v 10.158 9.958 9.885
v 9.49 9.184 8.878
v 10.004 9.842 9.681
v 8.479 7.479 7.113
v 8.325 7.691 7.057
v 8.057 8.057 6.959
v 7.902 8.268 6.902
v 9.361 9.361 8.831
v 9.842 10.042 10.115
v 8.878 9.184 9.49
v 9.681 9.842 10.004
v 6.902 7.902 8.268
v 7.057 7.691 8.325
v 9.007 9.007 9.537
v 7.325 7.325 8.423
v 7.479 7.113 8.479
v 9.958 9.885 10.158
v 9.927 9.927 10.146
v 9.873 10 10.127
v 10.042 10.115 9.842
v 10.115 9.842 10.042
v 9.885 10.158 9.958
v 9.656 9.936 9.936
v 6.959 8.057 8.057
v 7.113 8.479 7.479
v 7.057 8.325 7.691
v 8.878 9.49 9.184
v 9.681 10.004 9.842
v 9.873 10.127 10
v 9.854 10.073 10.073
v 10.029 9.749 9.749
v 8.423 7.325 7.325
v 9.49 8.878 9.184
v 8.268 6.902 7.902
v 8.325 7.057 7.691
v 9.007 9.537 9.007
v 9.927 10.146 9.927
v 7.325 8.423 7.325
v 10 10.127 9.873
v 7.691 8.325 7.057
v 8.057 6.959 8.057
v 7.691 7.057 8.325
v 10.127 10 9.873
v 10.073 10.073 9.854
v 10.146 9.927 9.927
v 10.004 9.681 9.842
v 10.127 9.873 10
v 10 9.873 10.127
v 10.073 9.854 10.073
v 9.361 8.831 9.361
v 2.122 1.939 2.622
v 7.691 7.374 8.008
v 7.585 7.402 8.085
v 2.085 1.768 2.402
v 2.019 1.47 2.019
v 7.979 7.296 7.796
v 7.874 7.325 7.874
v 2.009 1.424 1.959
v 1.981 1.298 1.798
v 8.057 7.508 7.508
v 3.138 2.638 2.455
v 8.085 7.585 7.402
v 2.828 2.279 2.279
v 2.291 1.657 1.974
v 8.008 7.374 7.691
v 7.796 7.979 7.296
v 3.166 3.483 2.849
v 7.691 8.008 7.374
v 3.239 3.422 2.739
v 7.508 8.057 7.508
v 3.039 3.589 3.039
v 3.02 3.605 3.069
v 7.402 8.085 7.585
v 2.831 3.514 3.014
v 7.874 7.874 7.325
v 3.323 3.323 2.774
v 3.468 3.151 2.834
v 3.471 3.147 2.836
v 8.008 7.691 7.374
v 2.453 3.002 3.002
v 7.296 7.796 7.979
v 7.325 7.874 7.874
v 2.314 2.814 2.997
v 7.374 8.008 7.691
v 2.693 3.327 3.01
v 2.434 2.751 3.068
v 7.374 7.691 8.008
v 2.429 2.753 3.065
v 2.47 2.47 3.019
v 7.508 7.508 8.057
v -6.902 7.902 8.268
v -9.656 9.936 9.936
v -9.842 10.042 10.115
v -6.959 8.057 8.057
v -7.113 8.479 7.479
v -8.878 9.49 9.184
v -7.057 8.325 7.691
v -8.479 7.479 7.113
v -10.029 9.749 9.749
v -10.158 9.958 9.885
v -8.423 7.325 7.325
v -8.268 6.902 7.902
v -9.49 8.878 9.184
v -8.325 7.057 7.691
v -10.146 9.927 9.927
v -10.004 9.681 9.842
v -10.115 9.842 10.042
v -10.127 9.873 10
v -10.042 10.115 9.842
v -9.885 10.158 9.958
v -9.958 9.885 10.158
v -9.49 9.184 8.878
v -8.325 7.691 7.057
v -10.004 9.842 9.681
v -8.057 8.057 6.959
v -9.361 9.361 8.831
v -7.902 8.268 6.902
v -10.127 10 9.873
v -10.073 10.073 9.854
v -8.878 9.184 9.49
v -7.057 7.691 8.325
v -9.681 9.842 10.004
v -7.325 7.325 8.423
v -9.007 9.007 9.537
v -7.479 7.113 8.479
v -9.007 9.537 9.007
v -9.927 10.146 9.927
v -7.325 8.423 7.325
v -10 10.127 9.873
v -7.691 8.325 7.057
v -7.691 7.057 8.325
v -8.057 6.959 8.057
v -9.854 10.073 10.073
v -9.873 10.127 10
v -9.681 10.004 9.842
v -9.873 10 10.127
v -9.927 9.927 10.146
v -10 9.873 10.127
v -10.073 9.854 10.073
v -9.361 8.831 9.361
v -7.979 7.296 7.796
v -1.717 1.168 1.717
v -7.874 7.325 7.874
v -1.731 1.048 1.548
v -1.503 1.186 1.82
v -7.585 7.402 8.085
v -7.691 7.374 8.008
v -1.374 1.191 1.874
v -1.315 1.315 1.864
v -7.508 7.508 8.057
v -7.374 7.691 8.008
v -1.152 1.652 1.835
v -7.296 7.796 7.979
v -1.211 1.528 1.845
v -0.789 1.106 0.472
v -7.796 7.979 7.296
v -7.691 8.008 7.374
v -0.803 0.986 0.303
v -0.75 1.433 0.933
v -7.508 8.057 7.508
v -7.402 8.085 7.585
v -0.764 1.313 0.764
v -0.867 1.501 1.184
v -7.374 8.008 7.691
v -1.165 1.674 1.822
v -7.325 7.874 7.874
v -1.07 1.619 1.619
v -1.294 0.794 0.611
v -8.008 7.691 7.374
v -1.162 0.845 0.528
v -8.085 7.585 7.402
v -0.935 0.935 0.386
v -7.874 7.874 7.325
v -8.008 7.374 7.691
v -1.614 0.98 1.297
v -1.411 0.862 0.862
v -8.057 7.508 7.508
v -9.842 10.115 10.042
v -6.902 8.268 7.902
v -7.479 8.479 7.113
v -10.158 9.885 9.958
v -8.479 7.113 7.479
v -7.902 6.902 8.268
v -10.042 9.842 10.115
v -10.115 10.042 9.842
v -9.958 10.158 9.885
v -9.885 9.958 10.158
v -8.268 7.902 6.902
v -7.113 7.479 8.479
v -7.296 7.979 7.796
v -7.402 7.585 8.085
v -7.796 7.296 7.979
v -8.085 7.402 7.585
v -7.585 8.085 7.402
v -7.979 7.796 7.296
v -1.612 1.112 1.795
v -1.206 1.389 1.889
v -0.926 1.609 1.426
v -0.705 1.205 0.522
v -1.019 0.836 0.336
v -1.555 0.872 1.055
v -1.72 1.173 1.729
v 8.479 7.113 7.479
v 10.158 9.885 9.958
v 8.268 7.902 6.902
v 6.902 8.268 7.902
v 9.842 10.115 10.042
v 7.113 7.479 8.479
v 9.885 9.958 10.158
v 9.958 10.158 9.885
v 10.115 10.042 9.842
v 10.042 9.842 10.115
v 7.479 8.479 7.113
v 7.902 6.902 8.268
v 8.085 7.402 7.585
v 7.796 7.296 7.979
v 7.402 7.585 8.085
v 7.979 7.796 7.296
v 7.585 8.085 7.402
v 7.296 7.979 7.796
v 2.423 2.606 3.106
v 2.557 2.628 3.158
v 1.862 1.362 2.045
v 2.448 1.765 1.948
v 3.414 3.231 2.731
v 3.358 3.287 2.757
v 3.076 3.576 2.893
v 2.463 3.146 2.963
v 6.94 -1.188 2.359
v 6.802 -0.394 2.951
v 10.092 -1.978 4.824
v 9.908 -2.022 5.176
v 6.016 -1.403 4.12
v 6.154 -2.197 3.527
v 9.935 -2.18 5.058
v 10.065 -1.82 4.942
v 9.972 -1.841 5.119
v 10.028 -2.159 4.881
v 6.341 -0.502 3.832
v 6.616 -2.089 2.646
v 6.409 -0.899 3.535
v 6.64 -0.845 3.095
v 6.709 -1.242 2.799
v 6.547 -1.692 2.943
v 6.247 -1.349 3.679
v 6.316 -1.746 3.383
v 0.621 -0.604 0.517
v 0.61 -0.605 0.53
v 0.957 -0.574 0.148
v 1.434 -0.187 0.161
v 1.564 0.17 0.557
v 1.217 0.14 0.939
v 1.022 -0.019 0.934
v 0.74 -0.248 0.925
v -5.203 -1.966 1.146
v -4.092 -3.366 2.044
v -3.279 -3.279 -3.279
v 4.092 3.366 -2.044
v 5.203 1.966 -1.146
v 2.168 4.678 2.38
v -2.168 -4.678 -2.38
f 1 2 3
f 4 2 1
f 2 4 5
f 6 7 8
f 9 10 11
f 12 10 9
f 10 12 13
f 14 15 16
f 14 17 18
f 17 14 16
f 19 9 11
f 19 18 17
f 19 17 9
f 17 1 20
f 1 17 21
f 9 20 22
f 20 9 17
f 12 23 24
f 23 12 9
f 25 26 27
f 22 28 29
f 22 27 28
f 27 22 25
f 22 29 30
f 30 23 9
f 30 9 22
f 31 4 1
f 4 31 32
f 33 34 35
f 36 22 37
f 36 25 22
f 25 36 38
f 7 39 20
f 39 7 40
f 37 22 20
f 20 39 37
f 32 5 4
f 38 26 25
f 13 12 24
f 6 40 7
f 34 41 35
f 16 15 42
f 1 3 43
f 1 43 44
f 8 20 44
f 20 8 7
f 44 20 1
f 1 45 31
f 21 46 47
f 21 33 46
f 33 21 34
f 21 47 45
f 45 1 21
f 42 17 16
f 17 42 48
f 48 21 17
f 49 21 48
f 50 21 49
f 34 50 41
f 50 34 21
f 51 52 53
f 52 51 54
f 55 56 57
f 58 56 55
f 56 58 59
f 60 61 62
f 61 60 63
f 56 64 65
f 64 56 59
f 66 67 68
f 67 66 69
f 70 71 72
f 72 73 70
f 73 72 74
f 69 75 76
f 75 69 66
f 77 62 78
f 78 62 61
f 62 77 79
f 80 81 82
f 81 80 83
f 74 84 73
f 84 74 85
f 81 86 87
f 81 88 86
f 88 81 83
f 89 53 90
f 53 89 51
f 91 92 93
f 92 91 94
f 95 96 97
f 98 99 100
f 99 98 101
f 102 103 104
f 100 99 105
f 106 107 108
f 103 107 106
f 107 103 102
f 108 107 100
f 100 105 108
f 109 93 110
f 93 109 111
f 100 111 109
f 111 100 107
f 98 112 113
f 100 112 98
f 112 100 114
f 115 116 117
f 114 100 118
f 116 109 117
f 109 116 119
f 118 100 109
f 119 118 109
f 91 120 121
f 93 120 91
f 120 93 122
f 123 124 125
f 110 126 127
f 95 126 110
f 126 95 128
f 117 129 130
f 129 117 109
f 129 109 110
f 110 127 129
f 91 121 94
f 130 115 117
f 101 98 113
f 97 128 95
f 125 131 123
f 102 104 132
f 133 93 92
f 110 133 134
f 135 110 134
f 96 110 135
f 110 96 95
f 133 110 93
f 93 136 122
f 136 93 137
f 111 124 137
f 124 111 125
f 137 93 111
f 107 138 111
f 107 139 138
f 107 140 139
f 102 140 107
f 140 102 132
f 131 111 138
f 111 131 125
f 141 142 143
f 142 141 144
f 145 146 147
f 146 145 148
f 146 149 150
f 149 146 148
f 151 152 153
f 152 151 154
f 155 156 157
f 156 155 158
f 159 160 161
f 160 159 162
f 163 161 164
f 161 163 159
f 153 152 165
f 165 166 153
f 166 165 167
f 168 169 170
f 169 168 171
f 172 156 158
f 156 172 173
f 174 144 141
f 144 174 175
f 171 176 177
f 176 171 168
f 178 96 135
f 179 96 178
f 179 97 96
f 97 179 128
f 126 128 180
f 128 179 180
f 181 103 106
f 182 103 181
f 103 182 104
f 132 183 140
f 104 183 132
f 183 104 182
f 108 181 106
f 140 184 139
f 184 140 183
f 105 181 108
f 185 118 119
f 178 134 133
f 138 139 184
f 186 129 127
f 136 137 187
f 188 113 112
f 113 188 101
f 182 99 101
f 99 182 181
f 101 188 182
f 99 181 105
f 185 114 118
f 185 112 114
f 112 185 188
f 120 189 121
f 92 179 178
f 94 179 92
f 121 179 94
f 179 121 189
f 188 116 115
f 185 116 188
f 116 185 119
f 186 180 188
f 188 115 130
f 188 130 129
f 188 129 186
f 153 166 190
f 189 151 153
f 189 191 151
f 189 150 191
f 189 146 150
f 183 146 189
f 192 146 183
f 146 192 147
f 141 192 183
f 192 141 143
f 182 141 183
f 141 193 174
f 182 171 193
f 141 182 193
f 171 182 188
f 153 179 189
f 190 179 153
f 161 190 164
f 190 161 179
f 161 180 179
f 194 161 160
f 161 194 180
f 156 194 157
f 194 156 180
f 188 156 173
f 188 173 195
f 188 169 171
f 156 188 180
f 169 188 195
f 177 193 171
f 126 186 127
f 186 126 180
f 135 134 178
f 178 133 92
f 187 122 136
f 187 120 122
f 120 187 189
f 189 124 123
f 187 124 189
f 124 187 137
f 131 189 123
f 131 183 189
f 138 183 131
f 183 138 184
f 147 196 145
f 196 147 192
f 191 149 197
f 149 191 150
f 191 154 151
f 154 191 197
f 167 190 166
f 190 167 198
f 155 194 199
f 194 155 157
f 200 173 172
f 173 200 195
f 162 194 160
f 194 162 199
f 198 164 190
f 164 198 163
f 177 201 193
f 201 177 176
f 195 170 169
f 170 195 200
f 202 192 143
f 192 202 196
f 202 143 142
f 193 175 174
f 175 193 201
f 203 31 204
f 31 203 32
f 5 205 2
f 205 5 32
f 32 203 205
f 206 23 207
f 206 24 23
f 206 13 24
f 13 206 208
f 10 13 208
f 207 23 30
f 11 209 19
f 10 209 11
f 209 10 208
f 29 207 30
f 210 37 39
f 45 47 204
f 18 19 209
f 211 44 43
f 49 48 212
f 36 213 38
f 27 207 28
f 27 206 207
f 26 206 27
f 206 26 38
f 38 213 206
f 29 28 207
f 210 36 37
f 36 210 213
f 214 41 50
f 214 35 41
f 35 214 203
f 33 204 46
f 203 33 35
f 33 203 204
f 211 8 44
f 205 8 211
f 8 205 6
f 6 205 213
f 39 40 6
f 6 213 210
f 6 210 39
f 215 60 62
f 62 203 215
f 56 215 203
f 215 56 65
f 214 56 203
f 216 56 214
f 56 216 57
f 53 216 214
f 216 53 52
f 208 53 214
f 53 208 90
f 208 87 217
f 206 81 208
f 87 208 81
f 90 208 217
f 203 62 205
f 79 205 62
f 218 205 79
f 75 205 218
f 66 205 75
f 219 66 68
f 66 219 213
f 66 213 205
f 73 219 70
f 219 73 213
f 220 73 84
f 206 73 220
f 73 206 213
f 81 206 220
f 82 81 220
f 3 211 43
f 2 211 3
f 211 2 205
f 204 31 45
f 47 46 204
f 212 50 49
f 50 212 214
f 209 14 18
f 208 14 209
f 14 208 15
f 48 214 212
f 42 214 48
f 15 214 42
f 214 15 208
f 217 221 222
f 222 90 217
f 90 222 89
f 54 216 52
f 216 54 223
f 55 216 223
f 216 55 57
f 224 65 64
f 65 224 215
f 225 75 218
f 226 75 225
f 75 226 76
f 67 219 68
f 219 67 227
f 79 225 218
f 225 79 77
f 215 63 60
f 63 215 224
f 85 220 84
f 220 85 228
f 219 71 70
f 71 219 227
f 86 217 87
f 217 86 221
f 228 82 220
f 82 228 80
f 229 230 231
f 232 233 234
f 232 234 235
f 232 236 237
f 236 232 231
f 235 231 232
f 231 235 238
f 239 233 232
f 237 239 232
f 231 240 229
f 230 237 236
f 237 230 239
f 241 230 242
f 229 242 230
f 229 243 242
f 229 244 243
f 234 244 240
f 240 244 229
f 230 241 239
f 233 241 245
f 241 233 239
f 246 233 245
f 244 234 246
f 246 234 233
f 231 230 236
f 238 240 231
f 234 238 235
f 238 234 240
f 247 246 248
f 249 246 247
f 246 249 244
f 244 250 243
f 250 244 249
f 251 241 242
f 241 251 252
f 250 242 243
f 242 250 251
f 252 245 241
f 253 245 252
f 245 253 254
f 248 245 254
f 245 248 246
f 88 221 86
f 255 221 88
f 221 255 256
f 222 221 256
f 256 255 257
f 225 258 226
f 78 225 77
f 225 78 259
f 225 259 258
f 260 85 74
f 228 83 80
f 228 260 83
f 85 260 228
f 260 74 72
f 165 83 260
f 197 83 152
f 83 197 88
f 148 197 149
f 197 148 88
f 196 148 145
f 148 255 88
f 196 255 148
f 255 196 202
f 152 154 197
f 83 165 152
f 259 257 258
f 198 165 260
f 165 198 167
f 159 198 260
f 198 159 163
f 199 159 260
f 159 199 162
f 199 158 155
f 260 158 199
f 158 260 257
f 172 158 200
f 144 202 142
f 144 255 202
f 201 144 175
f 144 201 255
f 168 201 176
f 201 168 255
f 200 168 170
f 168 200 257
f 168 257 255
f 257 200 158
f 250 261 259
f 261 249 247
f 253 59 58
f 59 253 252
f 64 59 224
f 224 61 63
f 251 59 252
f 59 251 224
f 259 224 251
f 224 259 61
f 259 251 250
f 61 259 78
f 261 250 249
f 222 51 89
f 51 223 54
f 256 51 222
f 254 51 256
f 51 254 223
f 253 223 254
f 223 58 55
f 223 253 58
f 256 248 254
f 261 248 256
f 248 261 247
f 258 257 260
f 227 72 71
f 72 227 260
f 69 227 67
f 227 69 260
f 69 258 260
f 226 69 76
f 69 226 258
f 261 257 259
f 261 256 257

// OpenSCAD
//---------------------------------------------------------------
//-- Openscad vector library
//-- This is a component of the obiscad opescad tools by Obijuan
//-- (C) Juan Gonzalez-Gomez (Obijuan)
//-- Sep-2012
//---------------------------------------------------------------
//-- Released under the GPL license
//---------------------------------------------------------------

obiscad_drawing_resolution = 6;

//----------------------------------------
//-- FUNCTIONS FOR WORKING WITH VECTORS
//----------------------------------------

//-- Calculate the module of a vector
function mod(v) = (sqrt(v[0]*v[0]+v[1]*v[1]+v[2]*v[2]));

//-- Calculate the cros product of two vectors
function cross(u,v) = [
  u[1]*v[2] - v[1]*u[2],
  -(u[0]*v[2] - v[0]*u[2]) ,
  u[0]*v[1] - v[0]*u[1]];

//-- Calculate the dot product of two vectors
function dot(u,v) = u[0]*v[0]+u[1]*v[1]+u[2]*v[2];

//-- Return the unit vector of a vector
function unitv(v) = v/mod(v);

//-- Return the angle between two vectores
function anglev(u,v) = acos( dot(u,v) / (mod(u)*mod(v)) );

//-- Return an arbitrary unitary vector othogonal to v
function orthounit2(v) = (v.x == 0 && v.y == 0 && v.z ==0 ) ? undef : (v.x == 0 && v.y == 0) ? [1,0,0] : let (r=norm([v.x, v.y, 0])) [v.y/r, -v.x/r, 0];

//-- Return an arbitrary vector othogonal to v
function ortho2(v) = (v.x == 0 && v.y == 0 && v.z== 0) ? undef : (v.x == 0 && v.y == 0) ? [1,0,0] : (v.y == 0) ? [1,0,0] : [1, -v.x/v.y, 0];

//----------------------------------------------------------
//--  Draw a point in the position given by the vector p  
//----------------------------------------------------------
module point(p)
{
  translate(p)
    sphere(r=0.7,$fn=obiscad_drawing_resolution);
}

//------------------------------------------------------------------
//-- Draw a vector poiting to the z axis
//-- This is an auxiliary module for implementing the vector module
//--
//-- Parameters:
//--  l: total vector length (line + arrow)
//--  l_arrow: Vector arrow length
//--  mark: If true, a mark is draw in the vector head, for having
//--    a visual reference of the rolling angle
//------------------------------------------------------------------
module vectorz(l=10, l_arrow=4, mark=false)
{
  //-- vector body length (not including the arrow)
  lb = l - l_arrow;

  //-- The vector is locatead at 0,0,0
  translate([0,0,lb/2])
  union() {

    //-- Draw the arrow
    translate([0,0,lb/2])
      cylinder(r1=2/2, r2=0.2, h=l_arrow, $fn=obiscad_drawing_resolution);

    //-- Draw the mark
    if (mark) {
      translate([0,0,lb/2+l_arrow/2])
      translate([1,0,0])
        cube([2,0.3,l_arrow*0.8],center=true);
    }

    //-- Draw the body
    cylinder(r=1/2, h=lb, center=true, $fn=obiscad_drawing_resolution);
  }

  //-- Draw a sphere in the vector base
  sphere(r=1/2, $fn=obiscad_drawing_resolution);
}

//-----------------------------------------------------------------
//-- ORIENTATE OPERATOR
//--
//--  Orientate an object to the direction given by the vector v
//--  Parameters:
//--    v : Target orientation
//--    vref: Vector reference. It is the vector of the local frame
//--          of the object that want to be poiting in the direction
//--          of v
//--    roll: Rotation of the object around the v axis
//-------------------------------------------------------------------
module orientate(v,vref=[0,0,1], roll=0)
{
  //-- Calculate the rotation axis
  cref = cross(vref, v);
  raxis = mod(cref) == 0 ? [1,0,0] : cref;
  
  //-- Calculate the angle between the vectors
  ang = anglev(vref,v);

  //-- Rotate the child!
  rotate(a=roll, v=v)
    rotate(a=ang, v=raxis)
      child(0);
}

//---------------------------------------------------------------------------
//-- Draw a vector 
//--
//-- There are two modes of drawing the vector
//-- * Mode 1: Given by a cartesian point(x,y,z). A vector from the origin
//--           to the end (x,y,z) is drawn. The l parameter (length) must 
//--           be 0  (l=0)
//-- * Mode 2: Give by direction and length
//--           A vector of length l pointing to the direction given by
//--           v is drawn
//---------------------------------------------------------------------------
//-- Parameters:
//--  v: Vector cartesian coordinates
//--  l: total vector length (line + arrow)
//--  l_arrow: Vector arrow length
//    mark: If true, a mark is draw in the vector head, for having
//--    a visual reference of the rolling angle
//---------------------------------------------------------------------------
module vector(v,l=0, l_arrow=4, mark=false)
{
  //-- Get the vector length from the coordinates
  mod = mod(v);

  //-- The vector is very easy implemented by means of the orientate
  //-- operator:
  //--  orientate(v) vectorz(l=mod, l_arrow=l_arrow)
  //--  BUT... in OPENSCAD 2012.02.22 the recursion does not
  //--    not work, so that if the user use the orientate operator
  //--    on a vector, openscad will ignore it..
  //-- The solution at the moment (I hope the openscad developers
  //--  implement the recursion in the near future...)
  //--  is to repite the orientate operation in this module

  //---- SAME CALCULATIONS THAN THE ORIENTATE OPERATOR!
  //-- Calculate the rotation axis

  vref = [0,0,1];
  cref = cross(vref, v);
  raxis = mod(cref) == 0 ? [1,0,0] : cref;
  
  //-- Calculate the angle between the vectors
  ang = anglev(vref,v);

  //-- orientate the vector
  //-- Draw the vector. The vector length is given either
  //--- by the mod variable (when l=0) or by l (when l!=0)
  if (l==0)
    rotate(a=ang, v=raxis)
      vectorz(l=mod, l_arrow=l_arrow, mark=mark);
  else
    rotate(a=ang, v=raxis)
      vectorz(l=l, l_arrow=l_arrow, mark=mark);

}

//----------------------------------------------------
//-- Draw a Frame of reference
//-- Parameters:
//-- l: length of the Unit vectors
//-----------------------------------------------------
module frame(l=10, l_arrow=4)
{

  //-- Z unit vector
  color("Blue")
    vector([0,0,l], l_arrow=l_arrow);

  //-- X unit vector
  color("Red")
    vector([l,0,0], l_arrow=l_arrow );

  //-- Y unit vector
  color("Green")
    vector([0,l,0],l_arrow=l_arrow);

  //-- Origin
  color("Gray")
    sphere(r=1, $fn=obiscad_drawing_resolution);
}

//--------------------------------------------------
//-- Modules for testings and examples
//-- Testing that the vector library is working ok
//--------------------------------------------------

//-- 22 vectors in total are drawn, poiting to different directions
module Test_vectors1()
{

  a = 20;
  k = 1;

  //--  Add a frame of reference (in the origin)
  frame(l=a);

  //-- Negative vectors, pointing towards the three axis: -x, -y, -z
  color("Red")   vector([-a, 0,  0]);
  color("Green") vector([0, -a,  0]);
  color("Blue")  vector([0,  0, -a]);

  //-- It is *not* has been implemented using a for loop on purpose
  //-- This way, individual vectors can be commented out or highlighted

  //-- vectors with positive z
  vector([a,   a, a*k]);
  vector([0,   a, a*k]);
  vector([-a,  a, a*k]);
  vector([-a,  0, a*k]);

  vector([-a, -a, a*k]);
  vector([0,  -a, a*k]);
  vector([a,  -a, a*k]);
  vector([a,   0, a*k]);


  //-- Vectors with negative z
  vector([a,   a, -a*k]);
  vector([0,   a, -a*k]);
  vector([-a,  a, -a*k]);
  vector([-a,  0, -a*k]);

  vector([-a, -a, -a*k]);
  vector([0,  -a, -a*k]);
  vector([a,  -a, -a*k]);
  vector([a,   0, -a*k]);
}

//--- Another test...
module Test_vectors2()
{

  //-- Add the vector into the vector table
  //-- This vectors are taken as directions
  //-- All the vectors will be drawn with the same length (l)
  vector_table = [
    [1,   1, 1],
    [0,   1, 1],
    [-1,  1, 1],
    [-1,  0, 1],
    [-1, -1, 1],
    [0,  -1, 1],
    [1,  -1, 1],
    [1,   0, 1],
    [0,   0, -1], // degenerate case 
    [1,   1, -1],
    [0,   1, -1],
    [-1,  1, -1],
    [-1,  0, -1],
    [-1, -1, -1],
    [0,  -1, -1],
    [1,  -1, -1],
    [1,   0, -1],
  ];

  //-- Vector length
  l=20;

  frame(l=10);

  //-- Draw all the vector given in the table
  //-- The vectors point to the direction given in the table
  //-- They all are drawn with a length equal to l
  for (v=vector_table) {
    //-- Vector given by direction and length
    vector(v,l=l);
  }
}


//-- Test the cross product and the angle
//-- between vectors
module Test_vector3()
{
  //-- Start with 2 unit vectors
  v=unitv([1,1,1]);
  u=unitv([0,1,0]);

  //-- Draw the vector in different colors
  //-- Increase the length for drawing
  color("Red") vector(v*20);
  color("blue") vector(u*20);

  //-- Get the cross product
  w = cross(v,u);
  vector(w*20);

  //-- The cross product is NOT conmutative... 
  //-- change the order of v and u
  w2 = cross(u,v);
  vector(w2*20);

  //-- w should be perpendicular to v and u
  //-- Calculate the angles between them:
  echo("U , V: ", anglev(u,v));
  echo("W , U: ", anglev(w,u));
  echo("W , V: ", anglev(w,v));

}

//-- Test the orientate operator
module Test_vector4()
{
  o = [10,10,10];
  v = [-10,10,10];

  color("Red") vector(o);
  color("Blue") vector(v);

  //-- Orientate the vector o in the direction of v
  orientate(v,o)
    vector(o);

  //-- Inverse operation: orientate the v vector in the direction
  //-- of o
  orientate(o,v)
    vector(v);

  //-- Example of orientation of a cube
  orientate(o,vref=[10,-2,5],roll=0)
    cube([10,2,5],center=true);

  vector([10,-2,5]);

}

//-- Test the degenerate case ie. the vectors are (anti)collinear
module Test_vector5()
{
  o = [0,0,10];
  v = [0,0,-10];

  color("Red") vector(o);
  color("Blue") vector(v);

  //-- Orientate the vector o in the direction of v
  orientate(v,o)
    vector(o);

  //-- Inverse operation: orientate the v vector in the direction
  //-- of o
  orientate(o,v)
    vector(v);
}

//-------- Perform tests......

Test_vector4();


/*

Test_vectors1();


translate([60,0,0]) 
  Test_vectors2();
*/
